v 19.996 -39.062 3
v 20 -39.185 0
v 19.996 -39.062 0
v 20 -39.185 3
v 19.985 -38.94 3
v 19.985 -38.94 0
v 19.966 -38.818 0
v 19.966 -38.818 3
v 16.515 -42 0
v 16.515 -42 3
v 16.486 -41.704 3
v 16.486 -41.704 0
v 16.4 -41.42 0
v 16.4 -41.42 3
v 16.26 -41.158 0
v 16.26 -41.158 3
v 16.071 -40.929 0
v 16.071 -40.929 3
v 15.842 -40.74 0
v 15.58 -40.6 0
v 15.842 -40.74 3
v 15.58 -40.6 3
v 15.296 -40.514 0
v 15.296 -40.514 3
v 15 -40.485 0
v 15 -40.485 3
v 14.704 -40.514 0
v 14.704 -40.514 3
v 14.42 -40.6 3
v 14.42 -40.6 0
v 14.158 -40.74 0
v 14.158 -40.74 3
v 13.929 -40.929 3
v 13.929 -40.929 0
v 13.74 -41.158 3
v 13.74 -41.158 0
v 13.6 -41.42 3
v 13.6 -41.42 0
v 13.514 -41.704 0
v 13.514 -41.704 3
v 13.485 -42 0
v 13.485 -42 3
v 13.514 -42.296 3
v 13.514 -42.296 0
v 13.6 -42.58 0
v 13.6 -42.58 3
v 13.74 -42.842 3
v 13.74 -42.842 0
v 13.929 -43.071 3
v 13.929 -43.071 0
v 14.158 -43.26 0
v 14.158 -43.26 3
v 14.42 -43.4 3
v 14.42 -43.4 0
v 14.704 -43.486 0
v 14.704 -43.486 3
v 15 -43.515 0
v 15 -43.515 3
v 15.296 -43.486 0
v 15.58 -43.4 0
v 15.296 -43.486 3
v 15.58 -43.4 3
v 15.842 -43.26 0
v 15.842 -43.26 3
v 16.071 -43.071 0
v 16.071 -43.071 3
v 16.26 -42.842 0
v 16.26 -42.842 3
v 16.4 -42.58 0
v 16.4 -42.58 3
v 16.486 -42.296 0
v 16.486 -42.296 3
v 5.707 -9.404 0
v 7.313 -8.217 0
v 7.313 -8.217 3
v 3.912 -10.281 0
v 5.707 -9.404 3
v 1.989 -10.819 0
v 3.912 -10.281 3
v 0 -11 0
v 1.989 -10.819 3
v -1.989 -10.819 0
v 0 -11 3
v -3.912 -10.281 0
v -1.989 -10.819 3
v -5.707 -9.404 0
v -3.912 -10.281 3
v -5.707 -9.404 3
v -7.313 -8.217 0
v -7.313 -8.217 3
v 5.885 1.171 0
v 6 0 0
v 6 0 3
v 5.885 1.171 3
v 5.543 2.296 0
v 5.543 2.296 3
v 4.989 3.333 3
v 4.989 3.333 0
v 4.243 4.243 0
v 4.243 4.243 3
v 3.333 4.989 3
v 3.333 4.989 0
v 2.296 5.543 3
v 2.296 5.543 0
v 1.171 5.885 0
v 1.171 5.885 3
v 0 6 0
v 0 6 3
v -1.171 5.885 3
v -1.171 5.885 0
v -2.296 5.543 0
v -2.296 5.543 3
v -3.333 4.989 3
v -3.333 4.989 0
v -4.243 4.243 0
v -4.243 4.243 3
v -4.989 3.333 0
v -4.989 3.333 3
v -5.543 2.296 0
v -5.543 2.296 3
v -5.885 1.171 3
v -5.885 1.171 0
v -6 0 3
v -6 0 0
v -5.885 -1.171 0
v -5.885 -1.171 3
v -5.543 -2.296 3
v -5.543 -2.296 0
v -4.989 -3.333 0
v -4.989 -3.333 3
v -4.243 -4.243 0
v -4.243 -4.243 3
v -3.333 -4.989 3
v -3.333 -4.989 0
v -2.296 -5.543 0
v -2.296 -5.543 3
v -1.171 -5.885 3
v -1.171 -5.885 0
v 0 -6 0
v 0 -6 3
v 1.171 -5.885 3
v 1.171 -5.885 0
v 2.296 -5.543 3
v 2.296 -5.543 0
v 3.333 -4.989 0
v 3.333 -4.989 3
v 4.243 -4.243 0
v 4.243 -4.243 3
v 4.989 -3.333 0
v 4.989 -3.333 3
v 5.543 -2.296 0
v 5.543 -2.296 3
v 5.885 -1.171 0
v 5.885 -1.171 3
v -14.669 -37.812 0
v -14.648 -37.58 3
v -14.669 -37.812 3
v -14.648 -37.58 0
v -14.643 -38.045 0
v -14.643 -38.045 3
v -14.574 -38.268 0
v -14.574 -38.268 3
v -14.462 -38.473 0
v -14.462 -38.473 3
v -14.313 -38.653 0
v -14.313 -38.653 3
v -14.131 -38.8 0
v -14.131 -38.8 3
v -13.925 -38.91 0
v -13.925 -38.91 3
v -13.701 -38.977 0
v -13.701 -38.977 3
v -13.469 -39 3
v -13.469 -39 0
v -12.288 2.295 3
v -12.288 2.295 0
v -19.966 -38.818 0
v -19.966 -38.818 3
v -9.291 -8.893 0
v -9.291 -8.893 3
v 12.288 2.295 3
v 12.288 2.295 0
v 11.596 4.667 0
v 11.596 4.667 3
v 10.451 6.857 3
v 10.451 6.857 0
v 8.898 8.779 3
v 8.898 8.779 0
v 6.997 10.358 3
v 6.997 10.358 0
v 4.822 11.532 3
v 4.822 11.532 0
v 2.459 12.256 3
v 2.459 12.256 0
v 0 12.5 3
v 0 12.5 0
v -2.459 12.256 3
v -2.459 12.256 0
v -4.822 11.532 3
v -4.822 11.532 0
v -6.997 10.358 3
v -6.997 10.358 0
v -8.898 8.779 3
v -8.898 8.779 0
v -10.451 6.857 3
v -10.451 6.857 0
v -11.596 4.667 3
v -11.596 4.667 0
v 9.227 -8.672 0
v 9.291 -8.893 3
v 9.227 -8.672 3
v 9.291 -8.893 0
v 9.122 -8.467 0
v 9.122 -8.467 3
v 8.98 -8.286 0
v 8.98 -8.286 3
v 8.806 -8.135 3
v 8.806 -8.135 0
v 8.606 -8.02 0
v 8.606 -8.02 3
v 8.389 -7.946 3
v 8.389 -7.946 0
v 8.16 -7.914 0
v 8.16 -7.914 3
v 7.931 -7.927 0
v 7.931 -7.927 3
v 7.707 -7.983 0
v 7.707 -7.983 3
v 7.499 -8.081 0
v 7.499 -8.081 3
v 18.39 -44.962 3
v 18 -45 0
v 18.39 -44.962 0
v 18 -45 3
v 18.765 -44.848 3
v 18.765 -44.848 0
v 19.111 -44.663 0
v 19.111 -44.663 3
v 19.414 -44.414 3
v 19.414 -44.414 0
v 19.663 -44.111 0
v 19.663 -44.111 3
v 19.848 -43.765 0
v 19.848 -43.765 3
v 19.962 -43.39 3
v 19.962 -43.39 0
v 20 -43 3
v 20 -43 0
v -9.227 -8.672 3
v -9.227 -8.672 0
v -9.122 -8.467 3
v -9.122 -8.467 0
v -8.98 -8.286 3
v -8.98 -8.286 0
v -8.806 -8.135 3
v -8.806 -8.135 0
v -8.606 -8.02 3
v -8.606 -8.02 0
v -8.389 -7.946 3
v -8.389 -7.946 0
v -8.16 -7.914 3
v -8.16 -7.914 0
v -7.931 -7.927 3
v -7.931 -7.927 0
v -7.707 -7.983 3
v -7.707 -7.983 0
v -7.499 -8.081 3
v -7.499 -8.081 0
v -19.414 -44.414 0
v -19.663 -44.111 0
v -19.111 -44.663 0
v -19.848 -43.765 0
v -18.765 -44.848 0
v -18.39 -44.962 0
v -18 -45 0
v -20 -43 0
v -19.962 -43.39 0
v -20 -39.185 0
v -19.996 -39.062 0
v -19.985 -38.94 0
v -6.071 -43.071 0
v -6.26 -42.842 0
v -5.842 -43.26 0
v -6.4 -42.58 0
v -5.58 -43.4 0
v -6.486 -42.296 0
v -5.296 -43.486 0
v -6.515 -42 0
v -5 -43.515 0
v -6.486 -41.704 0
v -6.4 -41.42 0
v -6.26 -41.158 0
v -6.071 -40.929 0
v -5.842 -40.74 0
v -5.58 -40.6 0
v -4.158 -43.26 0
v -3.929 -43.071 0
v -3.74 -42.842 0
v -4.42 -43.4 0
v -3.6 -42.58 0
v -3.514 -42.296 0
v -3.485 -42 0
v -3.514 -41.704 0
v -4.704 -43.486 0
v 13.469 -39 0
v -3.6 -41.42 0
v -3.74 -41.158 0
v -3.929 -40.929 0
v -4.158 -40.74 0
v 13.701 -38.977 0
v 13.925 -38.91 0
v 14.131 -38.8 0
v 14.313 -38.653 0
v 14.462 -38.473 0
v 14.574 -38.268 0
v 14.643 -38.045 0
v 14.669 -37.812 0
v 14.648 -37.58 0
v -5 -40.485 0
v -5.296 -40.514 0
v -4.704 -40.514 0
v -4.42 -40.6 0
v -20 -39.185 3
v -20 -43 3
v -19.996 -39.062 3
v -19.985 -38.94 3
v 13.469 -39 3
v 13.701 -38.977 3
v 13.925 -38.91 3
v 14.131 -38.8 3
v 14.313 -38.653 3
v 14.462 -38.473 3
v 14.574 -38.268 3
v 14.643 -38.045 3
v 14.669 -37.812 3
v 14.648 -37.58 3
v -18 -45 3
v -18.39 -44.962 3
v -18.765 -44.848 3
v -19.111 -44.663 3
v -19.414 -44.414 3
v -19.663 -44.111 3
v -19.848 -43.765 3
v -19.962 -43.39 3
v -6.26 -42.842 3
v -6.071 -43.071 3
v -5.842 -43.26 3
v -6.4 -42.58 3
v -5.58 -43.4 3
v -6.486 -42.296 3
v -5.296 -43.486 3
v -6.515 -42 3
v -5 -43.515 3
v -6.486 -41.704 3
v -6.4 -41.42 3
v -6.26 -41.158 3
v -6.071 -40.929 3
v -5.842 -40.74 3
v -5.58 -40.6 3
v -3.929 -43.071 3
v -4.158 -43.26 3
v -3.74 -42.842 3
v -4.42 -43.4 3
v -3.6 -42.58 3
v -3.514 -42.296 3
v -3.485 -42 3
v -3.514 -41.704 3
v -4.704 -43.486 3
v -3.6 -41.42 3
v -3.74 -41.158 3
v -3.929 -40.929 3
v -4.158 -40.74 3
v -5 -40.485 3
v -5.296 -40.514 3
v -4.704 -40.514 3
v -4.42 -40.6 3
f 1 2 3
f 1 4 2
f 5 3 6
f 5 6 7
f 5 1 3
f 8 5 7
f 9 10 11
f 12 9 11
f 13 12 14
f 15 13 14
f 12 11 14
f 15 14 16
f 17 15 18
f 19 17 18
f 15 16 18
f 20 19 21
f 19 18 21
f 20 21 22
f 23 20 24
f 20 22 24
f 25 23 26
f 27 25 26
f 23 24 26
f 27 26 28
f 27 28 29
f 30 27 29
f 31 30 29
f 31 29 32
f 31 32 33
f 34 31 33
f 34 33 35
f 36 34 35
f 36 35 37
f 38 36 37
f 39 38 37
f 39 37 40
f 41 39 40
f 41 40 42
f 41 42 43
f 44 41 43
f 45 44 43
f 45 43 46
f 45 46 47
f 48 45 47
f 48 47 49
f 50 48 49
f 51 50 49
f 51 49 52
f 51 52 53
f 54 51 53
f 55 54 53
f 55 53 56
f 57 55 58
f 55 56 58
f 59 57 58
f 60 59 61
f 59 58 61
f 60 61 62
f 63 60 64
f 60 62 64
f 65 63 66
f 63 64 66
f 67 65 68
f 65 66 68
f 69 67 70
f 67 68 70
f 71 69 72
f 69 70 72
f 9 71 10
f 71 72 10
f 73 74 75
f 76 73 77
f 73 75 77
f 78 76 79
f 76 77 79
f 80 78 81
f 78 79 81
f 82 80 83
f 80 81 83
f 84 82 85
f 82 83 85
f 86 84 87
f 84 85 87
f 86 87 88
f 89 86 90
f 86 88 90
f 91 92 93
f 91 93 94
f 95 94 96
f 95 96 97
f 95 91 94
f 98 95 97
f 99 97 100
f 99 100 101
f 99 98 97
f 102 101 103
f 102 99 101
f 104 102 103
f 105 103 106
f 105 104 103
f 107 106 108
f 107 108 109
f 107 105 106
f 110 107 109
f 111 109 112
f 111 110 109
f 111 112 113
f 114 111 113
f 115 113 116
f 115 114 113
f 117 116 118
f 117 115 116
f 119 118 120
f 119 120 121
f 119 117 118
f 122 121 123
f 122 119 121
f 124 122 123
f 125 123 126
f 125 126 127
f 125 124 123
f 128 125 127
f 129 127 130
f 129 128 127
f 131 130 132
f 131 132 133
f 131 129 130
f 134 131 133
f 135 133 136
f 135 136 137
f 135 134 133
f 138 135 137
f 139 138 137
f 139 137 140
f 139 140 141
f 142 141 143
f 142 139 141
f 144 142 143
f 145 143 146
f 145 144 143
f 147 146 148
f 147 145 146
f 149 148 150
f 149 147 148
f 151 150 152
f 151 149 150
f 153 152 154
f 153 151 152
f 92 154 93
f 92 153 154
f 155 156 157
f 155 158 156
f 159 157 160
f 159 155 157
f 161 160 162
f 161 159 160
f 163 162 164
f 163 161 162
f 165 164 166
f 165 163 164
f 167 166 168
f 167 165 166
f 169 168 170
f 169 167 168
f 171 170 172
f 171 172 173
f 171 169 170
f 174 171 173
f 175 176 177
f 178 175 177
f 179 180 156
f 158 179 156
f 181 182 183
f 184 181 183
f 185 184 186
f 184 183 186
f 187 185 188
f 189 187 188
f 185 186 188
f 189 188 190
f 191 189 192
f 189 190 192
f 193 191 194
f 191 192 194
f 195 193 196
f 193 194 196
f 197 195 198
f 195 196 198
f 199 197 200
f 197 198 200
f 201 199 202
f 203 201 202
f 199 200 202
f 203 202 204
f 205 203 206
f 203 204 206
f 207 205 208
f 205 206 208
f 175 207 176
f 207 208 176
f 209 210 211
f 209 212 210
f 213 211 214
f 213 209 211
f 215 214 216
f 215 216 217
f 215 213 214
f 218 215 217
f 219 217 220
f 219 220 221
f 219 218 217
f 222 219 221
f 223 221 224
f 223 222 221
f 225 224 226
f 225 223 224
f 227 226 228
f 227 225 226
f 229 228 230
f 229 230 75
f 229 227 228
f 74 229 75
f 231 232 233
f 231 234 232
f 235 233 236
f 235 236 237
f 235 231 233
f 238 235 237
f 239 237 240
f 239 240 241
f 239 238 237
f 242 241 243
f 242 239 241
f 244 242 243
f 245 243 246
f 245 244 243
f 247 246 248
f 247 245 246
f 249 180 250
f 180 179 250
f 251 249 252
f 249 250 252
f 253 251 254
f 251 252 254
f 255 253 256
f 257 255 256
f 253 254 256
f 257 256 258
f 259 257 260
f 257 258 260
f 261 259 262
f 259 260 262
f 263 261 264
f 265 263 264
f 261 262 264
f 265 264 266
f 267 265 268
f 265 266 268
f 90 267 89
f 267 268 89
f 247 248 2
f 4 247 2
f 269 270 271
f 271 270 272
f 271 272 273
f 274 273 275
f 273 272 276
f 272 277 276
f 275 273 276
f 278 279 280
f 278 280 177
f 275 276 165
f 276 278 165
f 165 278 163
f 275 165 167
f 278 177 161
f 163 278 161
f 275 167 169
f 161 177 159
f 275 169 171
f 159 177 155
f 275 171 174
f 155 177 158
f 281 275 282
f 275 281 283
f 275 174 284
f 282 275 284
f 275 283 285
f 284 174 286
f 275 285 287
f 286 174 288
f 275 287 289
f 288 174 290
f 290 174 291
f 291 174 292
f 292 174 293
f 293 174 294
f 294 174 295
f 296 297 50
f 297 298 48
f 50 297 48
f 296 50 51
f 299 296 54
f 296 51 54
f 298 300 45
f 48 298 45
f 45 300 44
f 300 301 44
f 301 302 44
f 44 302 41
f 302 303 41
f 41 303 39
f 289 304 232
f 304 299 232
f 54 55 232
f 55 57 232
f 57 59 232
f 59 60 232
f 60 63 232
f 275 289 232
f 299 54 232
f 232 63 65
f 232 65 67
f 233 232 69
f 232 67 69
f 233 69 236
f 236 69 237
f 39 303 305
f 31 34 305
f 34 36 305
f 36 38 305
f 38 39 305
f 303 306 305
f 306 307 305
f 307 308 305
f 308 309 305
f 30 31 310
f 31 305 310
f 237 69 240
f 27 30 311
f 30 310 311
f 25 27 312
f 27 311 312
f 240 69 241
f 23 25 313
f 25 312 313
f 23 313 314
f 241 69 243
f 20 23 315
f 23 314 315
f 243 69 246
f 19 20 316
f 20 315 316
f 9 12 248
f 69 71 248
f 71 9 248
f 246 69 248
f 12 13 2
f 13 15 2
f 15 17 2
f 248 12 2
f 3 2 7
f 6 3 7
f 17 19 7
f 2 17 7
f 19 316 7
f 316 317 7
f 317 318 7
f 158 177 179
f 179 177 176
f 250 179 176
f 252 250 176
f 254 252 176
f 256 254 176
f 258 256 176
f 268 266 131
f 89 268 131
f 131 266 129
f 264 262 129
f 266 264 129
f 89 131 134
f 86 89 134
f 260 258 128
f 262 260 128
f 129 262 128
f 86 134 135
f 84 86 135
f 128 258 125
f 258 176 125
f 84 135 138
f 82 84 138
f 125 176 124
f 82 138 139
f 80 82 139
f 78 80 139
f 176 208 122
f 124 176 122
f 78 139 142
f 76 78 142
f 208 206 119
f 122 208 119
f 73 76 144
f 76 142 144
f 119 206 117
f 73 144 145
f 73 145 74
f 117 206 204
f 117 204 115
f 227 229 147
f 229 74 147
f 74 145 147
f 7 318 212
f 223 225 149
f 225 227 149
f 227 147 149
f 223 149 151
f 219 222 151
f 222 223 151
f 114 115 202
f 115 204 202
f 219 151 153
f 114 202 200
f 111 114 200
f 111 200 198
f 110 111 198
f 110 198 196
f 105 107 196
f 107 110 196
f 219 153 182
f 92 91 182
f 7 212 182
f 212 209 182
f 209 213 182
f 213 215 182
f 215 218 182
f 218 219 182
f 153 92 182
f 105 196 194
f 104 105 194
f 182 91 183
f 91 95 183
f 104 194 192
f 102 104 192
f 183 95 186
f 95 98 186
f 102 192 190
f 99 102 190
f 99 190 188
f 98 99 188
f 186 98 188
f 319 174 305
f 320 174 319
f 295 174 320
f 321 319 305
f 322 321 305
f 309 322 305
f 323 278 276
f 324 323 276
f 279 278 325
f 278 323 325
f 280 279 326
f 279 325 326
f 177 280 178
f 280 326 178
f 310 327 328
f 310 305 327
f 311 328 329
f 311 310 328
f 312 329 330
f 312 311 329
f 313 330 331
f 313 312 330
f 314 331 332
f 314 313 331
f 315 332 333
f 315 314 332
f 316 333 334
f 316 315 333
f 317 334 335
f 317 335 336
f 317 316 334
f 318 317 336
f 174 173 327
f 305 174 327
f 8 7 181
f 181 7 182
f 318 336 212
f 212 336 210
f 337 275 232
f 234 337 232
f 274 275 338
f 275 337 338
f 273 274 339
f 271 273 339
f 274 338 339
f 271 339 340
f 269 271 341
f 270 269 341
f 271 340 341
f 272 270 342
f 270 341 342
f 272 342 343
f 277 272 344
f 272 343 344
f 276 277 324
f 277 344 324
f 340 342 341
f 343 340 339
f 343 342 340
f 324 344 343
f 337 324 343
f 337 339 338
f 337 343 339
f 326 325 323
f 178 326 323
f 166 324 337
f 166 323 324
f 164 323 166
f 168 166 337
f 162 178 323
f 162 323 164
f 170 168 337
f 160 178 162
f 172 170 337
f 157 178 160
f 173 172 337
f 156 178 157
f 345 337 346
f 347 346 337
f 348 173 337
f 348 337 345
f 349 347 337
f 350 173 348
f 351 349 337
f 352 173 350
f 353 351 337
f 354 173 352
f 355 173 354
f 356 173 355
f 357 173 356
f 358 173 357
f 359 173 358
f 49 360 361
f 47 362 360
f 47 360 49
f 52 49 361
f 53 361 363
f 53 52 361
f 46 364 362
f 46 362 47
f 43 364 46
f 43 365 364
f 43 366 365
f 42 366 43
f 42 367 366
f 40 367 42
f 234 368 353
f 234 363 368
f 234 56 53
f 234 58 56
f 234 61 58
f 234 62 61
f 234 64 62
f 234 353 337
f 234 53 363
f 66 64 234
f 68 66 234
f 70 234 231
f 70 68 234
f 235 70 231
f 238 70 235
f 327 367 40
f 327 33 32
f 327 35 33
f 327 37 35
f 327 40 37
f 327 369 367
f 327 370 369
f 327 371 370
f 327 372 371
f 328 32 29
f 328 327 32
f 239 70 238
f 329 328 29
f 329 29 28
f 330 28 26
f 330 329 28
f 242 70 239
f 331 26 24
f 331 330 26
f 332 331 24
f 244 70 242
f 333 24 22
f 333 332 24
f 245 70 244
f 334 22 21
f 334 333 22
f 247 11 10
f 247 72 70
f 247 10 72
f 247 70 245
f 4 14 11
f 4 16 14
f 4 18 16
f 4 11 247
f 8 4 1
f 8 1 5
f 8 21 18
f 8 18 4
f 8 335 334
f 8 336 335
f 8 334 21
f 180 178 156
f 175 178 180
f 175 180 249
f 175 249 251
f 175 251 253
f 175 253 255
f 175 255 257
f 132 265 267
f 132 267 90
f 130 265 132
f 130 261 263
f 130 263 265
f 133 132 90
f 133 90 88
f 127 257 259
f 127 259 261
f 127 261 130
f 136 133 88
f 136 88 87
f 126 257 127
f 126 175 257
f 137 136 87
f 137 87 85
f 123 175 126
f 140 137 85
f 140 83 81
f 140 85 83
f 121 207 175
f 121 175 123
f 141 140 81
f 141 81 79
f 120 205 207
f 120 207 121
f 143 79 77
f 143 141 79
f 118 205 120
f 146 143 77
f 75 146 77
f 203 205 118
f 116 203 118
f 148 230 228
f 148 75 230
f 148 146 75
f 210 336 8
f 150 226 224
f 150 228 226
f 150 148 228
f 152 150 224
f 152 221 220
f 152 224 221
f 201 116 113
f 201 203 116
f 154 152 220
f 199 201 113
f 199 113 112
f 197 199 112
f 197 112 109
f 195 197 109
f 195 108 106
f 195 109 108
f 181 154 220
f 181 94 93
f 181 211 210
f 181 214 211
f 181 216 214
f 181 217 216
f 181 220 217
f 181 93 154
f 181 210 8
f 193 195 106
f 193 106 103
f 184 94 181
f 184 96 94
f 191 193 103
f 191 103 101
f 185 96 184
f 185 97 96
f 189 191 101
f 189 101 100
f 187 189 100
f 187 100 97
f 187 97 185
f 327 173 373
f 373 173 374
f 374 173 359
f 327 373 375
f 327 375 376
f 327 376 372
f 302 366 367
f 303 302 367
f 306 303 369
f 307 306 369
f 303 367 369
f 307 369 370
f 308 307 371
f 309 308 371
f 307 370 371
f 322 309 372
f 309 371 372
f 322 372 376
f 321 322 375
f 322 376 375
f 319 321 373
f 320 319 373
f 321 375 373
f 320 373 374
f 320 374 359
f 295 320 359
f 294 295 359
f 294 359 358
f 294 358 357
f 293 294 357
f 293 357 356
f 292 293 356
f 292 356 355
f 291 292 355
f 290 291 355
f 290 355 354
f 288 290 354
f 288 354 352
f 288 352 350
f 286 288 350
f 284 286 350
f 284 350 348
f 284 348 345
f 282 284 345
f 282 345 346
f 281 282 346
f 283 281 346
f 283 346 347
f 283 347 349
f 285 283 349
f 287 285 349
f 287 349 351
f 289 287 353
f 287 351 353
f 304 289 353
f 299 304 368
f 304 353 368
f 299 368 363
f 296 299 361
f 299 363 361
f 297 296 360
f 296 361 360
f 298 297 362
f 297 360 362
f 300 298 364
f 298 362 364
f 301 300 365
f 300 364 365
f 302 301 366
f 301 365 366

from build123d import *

# Parameters (mm, degrees)
SKETCH_1_R          = 6
EXTRUDE_1_DEPTH     = 3
FILLET_1_R          = 2
SKETCH_2_R          = 1.515
CUT_EXTRUDE_1_DEPTH = 10
CUT_EXTRUDE_2_DEPTH = 10
FILLET_2_R          = 1.2


with BuildPart() as part:
    # 草图1 → 凸台-拉伸1 (new body)
    with BuildSketch(Plane.XY):
        with BuildLine():
            Line((-20, -45), (20, -45))
            Line((20, -45), (20, -39))
            Line((20, -39), (12.287533689, 2.294889071))
            ThreePointArc((12.287533689, 2.294889071), (0, 12.5), (-12.287533689, 2.294889071))
            Line((-12.287533689, 2.294889071), (-20, -39))
            Line((-20, -39), (-20, -45))
        make_face()
        Circle(SKETCH_1_R, mode=Mode.SUBTRACT)
    extrude(amount=EXTRUDE_1_DEPTH)

    # 圆角1
    fillet_1_edges = [part.edges().sort_by_distance(p)[0] for p in [
        (20, -39, 1.5),
        (20, -45, 1.5),
        (-20, -45, 1.5),
        (-20, -39, 1.5),
    ]]
    fillet(fillet_1_edges, radius=FILLET_1_R)

    # 草图2 → 切除-拉伸1 (cut)
    with BuildSketch(Plane.XY.offset(3)):
        with Locations((-5, -42)):
            Circle(SKETCH_2_R)
        with Locations((15, -42)):
            Circle(SKETCH_2_R)
    extrude(amount=-CUT_EXTRUDE_1_DEPTH, mode=Mode.SUBTRACT)

    # 草图3 → 切除-拉伸2 (cut)
    with BuildSketch(Plane.XY.offset(3)):
        with BuildLine():
            Line((-8.849829987, -6.53303216), (-14.913543956, -39))
            Line((-14.913543956, -39), (14.913543956, -39))
            Line((14.913543956, -39), (8.849829987, -6.53303216))
            ThreePointArc((8.849829987, -6.53303216), (0, -11), (-8.849829987, -6.53303216))
        make_face()
    extrude(amount=-CUT_EXTRUDE_2_DEPTH, mode=Mode.SUBTRACT)

    # 圆角2
    fillet_2_edges = [part.edges().sort_by_distance(p)[0] for p in [
        (-8.849829987, -6.53303216, 1.5),
        (8.849829987, -6.53303216, 1.5),
        (14.913543956, -39, 1.5),
        (-14.913543956, -39, 1.5),
    ]]
    fillet(fillet_2_edges, radius=FILLET_2_R)


solid = part.part
